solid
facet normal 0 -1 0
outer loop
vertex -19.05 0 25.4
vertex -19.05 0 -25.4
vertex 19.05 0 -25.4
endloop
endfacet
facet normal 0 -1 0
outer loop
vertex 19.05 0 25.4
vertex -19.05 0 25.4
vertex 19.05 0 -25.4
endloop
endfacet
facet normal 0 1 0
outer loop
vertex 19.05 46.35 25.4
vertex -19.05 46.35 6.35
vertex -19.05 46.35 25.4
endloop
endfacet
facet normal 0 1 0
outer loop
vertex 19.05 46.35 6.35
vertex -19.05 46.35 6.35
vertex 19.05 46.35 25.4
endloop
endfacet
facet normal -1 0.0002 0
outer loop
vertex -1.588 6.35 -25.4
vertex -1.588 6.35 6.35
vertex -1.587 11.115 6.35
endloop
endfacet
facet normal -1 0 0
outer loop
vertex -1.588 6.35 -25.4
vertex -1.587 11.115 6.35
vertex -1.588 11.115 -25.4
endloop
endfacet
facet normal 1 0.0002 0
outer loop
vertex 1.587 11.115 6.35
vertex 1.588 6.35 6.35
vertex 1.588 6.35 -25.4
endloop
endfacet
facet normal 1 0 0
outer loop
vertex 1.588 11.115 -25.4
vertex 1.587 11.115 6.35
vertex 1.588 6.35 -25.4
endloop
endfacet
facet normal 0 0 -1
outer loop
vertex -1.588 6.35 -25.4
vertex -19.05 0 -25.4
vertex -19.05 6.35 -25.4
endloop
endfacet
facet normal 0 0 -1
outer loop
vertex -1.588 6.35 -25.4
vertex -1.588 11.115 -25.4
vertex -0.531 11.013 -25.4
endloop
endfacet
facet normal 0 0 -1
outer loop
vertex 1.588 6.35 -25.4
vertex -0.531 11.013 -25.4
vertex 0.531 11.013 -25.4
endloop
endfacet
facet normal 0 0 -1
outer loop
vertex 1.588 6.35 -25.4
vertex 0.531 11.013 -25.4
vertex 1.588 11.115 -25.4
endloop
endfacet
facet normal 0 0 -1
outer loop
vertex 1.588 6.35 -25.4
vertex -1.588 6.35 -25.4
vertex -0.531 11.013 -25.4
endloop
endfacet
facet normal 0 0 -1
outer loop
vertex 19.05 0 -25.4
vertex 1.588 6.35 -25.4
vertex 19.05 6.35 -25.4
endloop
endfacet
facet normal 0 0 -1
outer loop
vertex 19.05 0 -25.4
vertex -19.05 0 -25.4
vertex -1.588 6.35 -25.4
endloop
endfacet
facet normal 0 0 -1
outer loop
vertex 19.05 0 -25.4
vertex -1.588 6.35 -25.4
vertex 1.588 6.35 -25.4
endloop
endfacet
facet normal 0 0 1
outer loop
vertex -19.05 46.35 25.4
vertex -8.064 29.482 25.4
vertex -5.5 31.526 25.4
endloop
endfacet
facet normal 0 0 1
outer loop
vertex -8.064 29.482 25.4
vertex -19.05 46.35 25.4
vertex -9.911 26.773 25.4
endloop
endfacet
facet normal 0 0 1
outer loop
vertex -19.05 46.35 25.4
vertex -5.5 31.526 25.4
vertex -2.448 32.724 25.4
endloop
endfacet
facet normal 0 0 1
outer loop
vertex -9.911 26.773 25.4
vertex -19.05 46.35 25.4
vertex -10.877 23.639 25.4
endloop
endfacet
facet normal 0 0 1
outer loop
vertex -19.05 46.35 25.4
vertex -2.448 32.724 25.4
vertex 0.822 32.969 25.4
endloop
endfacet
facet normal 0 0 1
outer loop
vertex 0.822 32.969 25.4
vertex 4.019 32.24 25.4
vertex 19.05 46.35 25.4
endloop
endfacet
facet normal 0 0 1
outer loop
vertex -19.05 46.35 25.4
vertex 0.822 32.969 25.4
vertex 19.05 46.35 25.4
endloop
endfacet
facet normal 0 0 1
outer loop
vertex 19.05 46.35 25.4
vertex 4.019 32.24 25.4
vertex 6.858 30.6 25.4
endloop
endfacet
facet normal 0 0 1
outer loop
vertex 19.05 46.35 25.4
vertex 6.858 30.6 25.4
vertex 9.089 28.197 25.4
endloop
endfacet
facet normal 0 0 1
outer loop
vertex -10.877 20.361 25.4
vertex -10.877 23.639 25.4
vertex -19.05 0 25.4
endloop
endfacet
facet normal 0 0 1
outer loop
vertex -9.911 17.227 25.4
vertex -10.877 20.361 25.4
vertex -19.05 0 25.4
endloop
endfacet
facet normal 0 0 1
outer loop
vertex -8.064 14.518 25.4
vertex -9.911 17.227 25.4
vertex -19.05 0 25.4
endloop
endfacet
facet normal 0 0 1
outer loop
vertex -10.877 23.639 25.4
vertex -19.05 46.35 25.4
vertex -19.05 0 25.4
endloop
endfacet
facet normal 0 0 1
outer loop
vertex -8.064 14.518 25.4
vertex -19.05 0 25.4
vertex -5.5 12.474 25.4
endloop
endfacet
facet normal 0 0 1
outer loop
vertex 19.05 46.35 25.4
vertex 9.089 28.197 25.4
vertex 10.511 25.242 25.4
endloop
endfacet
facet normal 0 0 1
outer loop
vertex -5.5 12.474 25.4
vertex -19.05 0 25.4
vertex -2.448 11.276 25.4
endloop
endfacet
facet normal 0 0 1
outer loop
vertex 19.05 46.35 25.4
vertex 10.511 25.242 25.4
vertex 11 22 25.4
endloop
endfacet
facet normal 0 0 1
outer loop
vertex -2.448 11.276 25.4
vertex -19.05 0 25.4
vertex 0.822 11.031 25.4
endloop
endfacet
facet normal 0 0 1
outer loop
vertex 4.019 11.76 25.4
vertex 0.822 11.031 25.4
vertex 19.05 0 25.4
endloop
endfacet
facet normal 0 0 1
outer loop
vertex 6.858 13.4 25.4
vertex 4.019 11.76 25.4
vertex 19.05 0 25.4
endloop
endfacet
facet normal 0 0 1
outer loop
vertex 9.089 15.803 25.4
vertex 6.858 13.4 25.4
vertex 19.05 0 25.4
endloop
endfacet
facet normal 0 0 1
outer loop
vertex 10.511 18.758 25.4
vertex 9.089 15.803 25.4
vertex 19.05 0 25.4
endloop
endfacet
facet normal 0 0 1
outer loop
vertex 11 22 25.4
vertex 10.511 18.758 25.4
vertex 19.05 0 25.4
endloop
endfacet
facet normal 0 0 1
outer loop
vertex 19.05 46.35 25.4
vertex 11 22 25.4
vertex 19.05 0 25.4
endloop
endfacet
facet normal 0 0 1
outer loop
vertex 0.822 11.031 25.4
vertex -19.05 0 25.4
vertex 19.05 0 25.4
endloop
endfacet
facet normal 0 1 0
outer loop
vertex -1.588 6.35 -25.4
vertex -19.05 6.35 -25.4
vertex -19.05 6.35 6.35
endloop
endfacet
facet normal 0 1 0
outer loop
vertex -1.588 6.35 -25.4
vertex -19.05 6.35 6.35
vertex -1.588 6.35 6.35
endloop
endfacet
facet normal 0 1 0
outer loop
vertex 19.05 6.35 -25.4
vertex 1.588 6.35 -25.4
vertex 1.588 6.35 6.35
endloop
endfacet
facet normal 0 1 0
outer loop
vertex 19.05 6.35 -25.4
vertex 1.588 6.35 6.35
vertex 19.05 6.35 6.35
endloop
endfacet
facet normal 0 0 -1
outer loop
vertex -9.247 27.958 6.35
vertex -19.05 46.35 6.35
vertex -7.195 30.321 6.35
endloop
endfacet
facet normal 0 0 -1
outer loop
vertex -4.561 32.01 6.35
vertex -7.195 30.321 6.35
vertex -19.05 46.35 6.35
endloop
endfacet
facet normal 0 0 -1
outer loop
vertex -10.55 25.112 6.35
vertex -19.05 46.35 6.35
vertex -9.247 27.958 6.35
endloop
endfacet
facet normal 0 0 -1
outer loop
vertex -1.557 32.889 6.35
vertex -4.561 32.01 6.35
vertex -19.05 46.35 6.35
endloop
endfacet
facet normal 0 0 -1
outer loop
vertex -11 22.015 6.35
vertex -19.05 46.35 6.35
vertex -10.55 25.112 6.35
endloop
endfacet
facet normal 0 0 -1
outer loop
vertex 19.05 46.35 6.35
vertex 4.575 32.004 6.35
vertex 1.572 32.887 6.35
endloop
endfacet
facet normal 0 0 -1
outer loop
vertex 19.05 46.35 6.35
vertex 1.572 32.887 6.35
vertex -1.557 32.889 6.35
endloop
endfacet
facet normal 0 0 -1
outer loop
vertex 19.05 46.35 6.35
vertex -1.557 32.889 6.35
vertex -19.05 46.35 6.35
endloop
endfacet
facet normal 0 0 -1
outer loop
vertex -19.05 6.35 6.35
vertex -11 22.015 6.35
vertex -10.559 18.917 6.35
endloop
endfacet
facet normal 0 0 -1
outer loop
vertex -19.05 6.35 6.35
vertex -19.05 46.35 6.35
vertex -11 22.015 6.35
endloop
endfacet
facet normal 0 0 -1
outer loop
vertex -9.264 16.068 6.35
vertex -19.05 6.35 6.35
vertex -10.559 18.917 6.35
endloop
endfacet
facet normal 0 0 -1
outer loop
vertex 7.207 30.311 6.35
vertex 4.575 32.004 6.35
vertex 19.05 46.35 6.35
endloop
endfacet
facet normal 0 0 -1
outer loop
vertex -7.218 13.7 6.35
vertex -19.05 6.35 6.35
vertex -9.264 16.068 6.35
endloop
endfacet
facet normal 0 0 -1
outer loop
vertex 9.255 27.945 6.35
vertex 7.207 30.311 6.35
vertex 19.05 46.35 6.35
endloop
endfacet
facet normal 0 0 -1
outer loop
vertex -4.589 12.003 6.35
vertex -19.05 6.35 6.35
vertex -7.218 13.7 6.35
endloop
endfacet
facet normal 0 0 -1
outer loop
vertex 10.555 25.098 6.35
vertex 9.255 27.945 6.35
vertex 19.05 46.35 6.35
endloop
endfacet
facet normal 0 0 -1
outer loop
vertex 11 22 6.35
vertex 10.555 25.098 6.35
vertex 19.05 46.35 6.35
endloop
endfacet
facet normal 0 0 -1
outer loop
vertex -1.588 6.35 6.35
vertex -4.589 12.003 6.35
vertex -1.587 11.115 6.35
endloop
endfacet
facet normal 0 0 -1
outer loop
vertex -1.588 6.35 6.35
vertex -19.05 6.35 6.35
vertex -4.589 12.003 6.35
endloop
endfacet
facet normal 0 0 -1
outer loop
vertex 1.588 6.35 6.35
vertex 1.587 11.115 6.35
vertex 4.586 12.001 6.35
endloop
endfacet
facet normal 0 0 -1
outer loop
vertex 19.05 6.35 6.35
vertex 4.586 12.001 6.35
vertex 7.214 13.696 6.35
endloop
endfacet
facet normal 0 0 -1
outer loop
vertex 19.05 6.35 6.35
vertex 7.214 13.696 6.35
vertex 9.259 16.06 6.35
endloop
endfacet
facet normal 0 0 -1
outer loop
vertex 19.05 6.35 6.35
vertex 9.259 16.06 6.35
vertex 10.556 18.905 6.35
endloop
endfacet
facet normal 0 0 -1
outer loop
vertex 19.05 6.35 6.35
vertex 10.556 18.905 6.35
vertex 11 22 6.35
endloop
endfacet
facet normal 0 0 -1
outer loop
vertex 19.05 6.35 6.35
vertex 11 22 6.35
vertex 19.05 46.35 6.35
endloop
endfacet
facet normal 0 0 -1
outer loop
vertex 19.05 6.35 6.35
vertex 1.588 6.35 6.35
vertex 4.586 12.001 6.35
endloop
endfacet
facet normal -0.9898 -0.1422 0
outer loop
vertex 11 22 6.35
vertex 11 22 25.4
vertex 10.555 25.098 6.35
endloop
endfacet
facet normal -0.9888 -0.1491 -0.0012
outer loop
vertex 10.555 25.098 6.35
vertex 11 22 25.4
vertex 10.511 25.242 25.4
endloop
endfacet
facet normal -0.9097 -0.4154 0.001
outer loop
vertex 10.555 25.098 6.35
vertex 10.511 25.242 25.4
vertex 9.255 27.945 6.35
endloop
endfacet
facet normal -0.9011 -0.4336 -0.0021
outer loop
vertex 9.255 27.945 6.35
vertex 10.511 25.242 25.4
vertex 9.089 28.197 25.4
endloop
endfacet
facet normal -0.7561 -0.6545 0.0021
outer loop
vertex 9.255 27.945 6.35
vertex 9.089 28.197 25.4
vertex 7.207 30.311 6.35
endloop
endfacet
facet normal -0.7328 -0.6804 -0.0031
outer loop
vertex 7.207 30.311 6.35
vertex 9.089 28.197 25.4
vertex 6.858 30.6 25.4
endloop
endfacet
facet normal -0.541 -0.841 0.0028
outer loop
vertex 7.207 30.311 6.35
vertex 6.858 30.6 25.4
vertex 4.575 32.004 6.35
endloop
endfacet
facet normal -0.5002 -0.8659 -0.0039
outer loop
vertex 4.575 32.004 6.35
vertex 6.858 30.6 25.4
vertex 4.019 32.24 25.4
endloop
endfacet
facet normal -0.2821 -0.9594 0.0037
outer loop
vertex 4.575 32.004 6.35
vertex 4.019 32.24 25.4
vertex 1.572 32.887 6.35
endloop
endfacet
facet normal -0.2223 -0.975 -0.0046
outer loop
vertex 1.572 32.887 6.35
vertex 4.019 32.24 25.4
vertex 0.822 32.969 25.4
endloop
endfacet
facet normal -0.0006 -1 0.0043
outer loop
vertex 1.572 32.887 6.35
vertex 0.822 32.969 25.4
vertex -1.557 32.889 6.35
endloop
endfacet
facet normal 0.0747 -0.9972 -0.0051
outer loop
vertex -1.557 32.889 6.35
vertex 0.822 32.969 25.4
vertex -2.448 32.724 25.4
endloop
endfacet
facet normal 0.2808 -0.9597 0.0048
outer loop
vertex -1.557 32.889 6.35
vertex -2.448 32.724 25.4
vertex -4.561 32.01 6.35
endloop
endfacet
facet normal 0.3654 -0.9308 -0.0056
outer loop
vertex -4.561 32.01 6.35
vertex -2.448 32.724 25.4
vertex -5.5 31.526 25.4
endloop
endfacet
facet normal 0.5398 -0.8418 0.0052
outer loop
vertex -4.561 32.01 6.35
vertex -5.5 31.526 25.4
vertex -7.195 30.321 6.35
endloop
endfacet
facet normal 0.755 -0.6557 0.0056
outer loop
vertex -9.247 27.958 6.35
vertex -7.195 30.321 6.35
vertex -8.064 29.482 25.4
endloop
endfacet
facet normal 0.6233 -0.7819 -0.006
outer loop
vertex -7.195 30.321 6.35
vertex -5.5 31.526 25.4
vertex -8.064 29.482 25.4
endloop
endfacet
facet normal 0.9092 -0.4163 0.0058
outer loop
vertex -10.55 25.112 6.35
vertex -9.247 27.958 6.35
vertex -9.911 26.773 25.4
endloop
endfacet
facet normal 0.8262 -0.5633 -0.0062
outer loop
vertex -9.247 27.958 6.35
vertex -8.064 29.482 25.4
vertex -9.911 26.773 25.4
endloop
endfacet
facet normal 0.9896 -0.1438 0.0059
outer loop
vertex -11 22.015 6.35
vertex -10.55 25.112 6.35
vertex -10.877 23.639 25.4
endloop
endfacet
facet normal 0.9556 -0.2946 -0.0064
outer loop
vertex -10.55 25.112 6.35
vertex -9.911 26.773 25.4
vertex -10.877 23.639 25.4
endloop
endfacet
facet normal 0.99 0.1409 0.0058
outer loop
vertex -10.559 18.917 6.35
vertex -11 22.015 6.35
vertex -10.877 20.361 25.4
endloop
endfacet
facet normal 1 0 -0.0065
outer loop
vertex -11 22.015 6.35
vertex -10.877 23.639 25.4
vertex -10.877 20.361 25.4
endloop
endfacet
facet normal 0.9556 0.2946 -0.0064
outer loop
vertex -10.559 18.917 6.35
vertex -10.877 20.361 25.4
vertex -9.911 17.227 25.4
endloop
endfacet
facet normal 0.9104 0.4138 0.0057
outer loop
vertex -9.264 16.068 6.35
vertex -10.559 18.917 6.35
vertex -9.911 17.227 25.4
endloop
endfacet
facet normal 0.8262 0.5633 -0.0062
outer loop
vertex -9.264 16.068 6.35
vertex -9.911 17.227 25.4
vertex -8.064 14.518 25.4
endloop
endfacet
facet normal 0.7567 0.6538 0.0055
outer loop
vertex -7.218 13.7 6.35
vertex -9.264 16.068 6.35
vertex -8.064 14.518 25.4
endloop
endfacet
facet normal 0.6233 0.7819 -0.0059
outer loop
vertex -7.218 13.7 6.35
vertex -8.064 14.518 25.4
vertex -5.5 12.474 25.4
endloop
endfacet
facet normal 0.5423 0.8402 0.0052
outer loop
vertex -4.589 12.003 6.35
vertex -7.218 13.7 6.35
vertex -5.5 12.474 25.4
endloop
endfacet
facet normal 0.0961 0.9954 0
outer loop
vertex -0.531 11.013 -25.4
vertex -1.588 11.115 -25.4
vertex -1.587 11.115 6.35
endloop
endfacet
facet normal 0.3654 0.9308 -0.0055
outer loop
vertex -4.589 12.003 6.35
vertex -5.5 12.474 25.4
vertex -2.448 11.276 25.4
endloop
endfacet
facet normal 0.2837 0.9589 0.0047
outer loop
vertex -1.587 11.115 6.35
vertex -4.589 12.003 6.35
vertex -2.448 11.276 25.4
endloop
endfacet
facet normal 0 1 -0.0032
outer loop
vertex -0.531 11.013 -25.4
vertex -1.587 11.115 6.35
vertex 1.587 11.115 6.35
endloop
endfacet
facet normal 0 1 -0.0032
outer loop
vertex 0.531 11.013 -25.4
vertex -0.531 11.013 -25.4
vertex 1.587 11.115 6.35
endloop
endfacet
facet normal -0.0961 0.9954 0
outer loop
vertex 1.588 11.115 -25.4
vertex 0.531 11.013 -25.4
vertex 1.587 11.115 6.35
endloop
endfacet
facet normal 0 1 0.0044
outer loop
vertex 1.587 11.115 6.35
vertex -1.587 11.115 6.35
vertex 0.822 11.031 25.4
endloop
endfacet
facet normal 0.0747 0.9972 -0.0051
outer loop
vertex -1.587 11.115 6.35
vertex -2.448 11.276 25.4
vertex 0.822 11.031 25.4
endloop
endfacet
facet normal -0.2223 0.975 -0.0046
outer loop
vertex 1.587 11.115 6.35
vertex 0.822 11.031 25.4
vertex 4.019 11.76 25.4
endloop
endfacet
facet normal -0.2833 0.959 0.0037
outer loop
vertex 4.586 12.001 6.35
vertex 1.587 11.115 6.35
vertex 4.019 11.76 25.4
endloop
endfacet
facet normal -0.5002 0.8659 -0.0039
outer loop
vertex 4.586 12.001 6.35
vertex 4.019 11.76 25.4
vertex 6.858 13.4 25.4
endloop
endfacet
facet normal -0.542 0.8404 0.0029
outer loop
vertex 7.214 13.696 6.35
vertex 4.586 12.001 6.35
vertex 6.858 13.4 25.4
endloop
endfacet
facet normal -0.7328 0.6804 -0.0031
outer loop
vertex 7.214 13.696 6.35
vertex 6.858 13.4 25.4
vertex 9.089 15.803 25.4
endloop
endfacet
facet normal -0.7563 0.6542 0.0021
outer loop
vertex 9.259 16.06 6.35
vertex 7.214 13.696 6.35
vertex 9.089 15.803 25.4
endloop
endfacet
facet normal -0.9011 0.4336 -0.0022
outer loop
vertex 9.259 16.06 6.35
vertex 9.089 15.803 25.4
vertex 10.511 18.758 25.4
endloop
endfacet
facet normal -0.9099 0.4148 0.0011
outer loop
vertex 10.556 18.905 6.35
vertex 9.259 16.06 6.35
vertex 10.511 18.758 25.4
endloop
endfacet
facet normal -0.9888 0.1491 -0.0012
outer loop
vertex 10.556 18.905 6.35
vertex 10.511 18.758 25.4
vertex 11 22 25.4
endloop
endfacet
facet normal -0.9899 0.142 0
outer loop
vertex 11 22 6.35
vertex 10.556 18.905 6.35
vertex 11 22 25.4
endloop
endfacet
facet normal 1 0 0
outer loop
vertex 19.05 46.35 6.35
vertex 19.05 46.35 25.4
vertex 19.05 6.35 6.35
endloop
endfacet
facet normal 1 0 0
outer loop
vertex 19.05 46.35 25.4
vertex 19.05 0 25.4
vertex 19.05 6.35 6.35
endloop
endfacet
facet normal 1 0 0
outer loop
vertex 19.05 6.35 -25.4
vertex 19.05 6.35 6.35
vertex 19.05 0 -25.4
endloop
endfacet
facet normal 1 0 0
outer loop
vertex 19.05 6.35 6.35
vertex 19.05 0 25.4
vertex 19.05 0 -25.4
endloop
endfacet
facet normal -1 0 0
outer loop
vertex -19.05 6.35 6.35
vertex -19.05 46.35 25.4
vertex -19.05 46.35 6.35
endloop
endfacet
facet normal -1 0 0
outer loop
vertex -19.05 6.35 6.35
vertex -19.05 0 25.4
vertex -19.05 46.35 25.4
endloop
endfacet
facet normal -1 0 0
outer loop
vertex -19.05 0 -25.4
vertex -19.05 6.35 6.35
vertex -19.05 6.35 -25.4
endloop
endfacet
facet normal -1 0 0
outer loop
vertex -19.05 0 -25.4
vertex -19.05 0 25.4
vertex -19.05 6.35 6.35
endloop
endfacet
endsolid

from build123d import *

# Parameters (mm, degrees)
SKETCH1_W           = 38.1
SKETCH1_H           = 50.8
BOSS_EXTRUDE1_DEPTH = 6.35
SKETCH2_W           = 3.175
SKETCH2_H           = 50.8
BOSS_EXTRUDE2_DEPTH = 6.35
SKETCH3_W           = 38.1
SKETCH3_H           = 19.05
BOSS_EXTRUDE3_DEPTH = 40
SKETCH4_R           = 11
CUT_EXTRUDE1_DEPTH  = 72.357305162


with BuildPart() as part:
    # Sketch1 → Boss-Extrude1 (new body)
    with BuildSketch(Plane(origin=(0, 0, 0), x_dir=(1, 0, 0), z_dir=(0, 1, 0))):
        Rectangle(SKETCH1_W, SKETCH1_H)
    extrude(amount=BOSS_EXTRUDE1_DEPTH)

    # Sketch2 → Boss-Extrude2 (add)
    with BuildSketch(Plane(origin=(0, 6.35, 0), x_dir=(1, 0, 0), z_dir=(0, 1, 0))):
        Rectangle(SKETCH2_W, SKETCH2_H)
    extrude(amount=BOSS_EXTRUDE2_DEPTH)

    # Sketch3 → Boss-Extrude3 (add)
    with BuildSketch(Plane(origin=(0, 6.35, 0), x_dir=(1, 0, 0), z_dir=(0, 1, 0))):
        with Locations((0, -15.875)):
            Rectangle(SKETCH3_W, SKETCH3_H)
    extrude(amount=BOSS_EXTRUDE3_DEPTH)

    # Sketch4 → Cut-Extrude1 (cut, through all)
    with BuildSketch(Plane.XY.offset(25.4)):
        with Locations((0, 22)):
            Circle(SKETCH4_R)
    extrude(amount=-CUT_EXTRUDE1_DEPTH, mode=Mode.SUBTRACT)


solid = part.part
